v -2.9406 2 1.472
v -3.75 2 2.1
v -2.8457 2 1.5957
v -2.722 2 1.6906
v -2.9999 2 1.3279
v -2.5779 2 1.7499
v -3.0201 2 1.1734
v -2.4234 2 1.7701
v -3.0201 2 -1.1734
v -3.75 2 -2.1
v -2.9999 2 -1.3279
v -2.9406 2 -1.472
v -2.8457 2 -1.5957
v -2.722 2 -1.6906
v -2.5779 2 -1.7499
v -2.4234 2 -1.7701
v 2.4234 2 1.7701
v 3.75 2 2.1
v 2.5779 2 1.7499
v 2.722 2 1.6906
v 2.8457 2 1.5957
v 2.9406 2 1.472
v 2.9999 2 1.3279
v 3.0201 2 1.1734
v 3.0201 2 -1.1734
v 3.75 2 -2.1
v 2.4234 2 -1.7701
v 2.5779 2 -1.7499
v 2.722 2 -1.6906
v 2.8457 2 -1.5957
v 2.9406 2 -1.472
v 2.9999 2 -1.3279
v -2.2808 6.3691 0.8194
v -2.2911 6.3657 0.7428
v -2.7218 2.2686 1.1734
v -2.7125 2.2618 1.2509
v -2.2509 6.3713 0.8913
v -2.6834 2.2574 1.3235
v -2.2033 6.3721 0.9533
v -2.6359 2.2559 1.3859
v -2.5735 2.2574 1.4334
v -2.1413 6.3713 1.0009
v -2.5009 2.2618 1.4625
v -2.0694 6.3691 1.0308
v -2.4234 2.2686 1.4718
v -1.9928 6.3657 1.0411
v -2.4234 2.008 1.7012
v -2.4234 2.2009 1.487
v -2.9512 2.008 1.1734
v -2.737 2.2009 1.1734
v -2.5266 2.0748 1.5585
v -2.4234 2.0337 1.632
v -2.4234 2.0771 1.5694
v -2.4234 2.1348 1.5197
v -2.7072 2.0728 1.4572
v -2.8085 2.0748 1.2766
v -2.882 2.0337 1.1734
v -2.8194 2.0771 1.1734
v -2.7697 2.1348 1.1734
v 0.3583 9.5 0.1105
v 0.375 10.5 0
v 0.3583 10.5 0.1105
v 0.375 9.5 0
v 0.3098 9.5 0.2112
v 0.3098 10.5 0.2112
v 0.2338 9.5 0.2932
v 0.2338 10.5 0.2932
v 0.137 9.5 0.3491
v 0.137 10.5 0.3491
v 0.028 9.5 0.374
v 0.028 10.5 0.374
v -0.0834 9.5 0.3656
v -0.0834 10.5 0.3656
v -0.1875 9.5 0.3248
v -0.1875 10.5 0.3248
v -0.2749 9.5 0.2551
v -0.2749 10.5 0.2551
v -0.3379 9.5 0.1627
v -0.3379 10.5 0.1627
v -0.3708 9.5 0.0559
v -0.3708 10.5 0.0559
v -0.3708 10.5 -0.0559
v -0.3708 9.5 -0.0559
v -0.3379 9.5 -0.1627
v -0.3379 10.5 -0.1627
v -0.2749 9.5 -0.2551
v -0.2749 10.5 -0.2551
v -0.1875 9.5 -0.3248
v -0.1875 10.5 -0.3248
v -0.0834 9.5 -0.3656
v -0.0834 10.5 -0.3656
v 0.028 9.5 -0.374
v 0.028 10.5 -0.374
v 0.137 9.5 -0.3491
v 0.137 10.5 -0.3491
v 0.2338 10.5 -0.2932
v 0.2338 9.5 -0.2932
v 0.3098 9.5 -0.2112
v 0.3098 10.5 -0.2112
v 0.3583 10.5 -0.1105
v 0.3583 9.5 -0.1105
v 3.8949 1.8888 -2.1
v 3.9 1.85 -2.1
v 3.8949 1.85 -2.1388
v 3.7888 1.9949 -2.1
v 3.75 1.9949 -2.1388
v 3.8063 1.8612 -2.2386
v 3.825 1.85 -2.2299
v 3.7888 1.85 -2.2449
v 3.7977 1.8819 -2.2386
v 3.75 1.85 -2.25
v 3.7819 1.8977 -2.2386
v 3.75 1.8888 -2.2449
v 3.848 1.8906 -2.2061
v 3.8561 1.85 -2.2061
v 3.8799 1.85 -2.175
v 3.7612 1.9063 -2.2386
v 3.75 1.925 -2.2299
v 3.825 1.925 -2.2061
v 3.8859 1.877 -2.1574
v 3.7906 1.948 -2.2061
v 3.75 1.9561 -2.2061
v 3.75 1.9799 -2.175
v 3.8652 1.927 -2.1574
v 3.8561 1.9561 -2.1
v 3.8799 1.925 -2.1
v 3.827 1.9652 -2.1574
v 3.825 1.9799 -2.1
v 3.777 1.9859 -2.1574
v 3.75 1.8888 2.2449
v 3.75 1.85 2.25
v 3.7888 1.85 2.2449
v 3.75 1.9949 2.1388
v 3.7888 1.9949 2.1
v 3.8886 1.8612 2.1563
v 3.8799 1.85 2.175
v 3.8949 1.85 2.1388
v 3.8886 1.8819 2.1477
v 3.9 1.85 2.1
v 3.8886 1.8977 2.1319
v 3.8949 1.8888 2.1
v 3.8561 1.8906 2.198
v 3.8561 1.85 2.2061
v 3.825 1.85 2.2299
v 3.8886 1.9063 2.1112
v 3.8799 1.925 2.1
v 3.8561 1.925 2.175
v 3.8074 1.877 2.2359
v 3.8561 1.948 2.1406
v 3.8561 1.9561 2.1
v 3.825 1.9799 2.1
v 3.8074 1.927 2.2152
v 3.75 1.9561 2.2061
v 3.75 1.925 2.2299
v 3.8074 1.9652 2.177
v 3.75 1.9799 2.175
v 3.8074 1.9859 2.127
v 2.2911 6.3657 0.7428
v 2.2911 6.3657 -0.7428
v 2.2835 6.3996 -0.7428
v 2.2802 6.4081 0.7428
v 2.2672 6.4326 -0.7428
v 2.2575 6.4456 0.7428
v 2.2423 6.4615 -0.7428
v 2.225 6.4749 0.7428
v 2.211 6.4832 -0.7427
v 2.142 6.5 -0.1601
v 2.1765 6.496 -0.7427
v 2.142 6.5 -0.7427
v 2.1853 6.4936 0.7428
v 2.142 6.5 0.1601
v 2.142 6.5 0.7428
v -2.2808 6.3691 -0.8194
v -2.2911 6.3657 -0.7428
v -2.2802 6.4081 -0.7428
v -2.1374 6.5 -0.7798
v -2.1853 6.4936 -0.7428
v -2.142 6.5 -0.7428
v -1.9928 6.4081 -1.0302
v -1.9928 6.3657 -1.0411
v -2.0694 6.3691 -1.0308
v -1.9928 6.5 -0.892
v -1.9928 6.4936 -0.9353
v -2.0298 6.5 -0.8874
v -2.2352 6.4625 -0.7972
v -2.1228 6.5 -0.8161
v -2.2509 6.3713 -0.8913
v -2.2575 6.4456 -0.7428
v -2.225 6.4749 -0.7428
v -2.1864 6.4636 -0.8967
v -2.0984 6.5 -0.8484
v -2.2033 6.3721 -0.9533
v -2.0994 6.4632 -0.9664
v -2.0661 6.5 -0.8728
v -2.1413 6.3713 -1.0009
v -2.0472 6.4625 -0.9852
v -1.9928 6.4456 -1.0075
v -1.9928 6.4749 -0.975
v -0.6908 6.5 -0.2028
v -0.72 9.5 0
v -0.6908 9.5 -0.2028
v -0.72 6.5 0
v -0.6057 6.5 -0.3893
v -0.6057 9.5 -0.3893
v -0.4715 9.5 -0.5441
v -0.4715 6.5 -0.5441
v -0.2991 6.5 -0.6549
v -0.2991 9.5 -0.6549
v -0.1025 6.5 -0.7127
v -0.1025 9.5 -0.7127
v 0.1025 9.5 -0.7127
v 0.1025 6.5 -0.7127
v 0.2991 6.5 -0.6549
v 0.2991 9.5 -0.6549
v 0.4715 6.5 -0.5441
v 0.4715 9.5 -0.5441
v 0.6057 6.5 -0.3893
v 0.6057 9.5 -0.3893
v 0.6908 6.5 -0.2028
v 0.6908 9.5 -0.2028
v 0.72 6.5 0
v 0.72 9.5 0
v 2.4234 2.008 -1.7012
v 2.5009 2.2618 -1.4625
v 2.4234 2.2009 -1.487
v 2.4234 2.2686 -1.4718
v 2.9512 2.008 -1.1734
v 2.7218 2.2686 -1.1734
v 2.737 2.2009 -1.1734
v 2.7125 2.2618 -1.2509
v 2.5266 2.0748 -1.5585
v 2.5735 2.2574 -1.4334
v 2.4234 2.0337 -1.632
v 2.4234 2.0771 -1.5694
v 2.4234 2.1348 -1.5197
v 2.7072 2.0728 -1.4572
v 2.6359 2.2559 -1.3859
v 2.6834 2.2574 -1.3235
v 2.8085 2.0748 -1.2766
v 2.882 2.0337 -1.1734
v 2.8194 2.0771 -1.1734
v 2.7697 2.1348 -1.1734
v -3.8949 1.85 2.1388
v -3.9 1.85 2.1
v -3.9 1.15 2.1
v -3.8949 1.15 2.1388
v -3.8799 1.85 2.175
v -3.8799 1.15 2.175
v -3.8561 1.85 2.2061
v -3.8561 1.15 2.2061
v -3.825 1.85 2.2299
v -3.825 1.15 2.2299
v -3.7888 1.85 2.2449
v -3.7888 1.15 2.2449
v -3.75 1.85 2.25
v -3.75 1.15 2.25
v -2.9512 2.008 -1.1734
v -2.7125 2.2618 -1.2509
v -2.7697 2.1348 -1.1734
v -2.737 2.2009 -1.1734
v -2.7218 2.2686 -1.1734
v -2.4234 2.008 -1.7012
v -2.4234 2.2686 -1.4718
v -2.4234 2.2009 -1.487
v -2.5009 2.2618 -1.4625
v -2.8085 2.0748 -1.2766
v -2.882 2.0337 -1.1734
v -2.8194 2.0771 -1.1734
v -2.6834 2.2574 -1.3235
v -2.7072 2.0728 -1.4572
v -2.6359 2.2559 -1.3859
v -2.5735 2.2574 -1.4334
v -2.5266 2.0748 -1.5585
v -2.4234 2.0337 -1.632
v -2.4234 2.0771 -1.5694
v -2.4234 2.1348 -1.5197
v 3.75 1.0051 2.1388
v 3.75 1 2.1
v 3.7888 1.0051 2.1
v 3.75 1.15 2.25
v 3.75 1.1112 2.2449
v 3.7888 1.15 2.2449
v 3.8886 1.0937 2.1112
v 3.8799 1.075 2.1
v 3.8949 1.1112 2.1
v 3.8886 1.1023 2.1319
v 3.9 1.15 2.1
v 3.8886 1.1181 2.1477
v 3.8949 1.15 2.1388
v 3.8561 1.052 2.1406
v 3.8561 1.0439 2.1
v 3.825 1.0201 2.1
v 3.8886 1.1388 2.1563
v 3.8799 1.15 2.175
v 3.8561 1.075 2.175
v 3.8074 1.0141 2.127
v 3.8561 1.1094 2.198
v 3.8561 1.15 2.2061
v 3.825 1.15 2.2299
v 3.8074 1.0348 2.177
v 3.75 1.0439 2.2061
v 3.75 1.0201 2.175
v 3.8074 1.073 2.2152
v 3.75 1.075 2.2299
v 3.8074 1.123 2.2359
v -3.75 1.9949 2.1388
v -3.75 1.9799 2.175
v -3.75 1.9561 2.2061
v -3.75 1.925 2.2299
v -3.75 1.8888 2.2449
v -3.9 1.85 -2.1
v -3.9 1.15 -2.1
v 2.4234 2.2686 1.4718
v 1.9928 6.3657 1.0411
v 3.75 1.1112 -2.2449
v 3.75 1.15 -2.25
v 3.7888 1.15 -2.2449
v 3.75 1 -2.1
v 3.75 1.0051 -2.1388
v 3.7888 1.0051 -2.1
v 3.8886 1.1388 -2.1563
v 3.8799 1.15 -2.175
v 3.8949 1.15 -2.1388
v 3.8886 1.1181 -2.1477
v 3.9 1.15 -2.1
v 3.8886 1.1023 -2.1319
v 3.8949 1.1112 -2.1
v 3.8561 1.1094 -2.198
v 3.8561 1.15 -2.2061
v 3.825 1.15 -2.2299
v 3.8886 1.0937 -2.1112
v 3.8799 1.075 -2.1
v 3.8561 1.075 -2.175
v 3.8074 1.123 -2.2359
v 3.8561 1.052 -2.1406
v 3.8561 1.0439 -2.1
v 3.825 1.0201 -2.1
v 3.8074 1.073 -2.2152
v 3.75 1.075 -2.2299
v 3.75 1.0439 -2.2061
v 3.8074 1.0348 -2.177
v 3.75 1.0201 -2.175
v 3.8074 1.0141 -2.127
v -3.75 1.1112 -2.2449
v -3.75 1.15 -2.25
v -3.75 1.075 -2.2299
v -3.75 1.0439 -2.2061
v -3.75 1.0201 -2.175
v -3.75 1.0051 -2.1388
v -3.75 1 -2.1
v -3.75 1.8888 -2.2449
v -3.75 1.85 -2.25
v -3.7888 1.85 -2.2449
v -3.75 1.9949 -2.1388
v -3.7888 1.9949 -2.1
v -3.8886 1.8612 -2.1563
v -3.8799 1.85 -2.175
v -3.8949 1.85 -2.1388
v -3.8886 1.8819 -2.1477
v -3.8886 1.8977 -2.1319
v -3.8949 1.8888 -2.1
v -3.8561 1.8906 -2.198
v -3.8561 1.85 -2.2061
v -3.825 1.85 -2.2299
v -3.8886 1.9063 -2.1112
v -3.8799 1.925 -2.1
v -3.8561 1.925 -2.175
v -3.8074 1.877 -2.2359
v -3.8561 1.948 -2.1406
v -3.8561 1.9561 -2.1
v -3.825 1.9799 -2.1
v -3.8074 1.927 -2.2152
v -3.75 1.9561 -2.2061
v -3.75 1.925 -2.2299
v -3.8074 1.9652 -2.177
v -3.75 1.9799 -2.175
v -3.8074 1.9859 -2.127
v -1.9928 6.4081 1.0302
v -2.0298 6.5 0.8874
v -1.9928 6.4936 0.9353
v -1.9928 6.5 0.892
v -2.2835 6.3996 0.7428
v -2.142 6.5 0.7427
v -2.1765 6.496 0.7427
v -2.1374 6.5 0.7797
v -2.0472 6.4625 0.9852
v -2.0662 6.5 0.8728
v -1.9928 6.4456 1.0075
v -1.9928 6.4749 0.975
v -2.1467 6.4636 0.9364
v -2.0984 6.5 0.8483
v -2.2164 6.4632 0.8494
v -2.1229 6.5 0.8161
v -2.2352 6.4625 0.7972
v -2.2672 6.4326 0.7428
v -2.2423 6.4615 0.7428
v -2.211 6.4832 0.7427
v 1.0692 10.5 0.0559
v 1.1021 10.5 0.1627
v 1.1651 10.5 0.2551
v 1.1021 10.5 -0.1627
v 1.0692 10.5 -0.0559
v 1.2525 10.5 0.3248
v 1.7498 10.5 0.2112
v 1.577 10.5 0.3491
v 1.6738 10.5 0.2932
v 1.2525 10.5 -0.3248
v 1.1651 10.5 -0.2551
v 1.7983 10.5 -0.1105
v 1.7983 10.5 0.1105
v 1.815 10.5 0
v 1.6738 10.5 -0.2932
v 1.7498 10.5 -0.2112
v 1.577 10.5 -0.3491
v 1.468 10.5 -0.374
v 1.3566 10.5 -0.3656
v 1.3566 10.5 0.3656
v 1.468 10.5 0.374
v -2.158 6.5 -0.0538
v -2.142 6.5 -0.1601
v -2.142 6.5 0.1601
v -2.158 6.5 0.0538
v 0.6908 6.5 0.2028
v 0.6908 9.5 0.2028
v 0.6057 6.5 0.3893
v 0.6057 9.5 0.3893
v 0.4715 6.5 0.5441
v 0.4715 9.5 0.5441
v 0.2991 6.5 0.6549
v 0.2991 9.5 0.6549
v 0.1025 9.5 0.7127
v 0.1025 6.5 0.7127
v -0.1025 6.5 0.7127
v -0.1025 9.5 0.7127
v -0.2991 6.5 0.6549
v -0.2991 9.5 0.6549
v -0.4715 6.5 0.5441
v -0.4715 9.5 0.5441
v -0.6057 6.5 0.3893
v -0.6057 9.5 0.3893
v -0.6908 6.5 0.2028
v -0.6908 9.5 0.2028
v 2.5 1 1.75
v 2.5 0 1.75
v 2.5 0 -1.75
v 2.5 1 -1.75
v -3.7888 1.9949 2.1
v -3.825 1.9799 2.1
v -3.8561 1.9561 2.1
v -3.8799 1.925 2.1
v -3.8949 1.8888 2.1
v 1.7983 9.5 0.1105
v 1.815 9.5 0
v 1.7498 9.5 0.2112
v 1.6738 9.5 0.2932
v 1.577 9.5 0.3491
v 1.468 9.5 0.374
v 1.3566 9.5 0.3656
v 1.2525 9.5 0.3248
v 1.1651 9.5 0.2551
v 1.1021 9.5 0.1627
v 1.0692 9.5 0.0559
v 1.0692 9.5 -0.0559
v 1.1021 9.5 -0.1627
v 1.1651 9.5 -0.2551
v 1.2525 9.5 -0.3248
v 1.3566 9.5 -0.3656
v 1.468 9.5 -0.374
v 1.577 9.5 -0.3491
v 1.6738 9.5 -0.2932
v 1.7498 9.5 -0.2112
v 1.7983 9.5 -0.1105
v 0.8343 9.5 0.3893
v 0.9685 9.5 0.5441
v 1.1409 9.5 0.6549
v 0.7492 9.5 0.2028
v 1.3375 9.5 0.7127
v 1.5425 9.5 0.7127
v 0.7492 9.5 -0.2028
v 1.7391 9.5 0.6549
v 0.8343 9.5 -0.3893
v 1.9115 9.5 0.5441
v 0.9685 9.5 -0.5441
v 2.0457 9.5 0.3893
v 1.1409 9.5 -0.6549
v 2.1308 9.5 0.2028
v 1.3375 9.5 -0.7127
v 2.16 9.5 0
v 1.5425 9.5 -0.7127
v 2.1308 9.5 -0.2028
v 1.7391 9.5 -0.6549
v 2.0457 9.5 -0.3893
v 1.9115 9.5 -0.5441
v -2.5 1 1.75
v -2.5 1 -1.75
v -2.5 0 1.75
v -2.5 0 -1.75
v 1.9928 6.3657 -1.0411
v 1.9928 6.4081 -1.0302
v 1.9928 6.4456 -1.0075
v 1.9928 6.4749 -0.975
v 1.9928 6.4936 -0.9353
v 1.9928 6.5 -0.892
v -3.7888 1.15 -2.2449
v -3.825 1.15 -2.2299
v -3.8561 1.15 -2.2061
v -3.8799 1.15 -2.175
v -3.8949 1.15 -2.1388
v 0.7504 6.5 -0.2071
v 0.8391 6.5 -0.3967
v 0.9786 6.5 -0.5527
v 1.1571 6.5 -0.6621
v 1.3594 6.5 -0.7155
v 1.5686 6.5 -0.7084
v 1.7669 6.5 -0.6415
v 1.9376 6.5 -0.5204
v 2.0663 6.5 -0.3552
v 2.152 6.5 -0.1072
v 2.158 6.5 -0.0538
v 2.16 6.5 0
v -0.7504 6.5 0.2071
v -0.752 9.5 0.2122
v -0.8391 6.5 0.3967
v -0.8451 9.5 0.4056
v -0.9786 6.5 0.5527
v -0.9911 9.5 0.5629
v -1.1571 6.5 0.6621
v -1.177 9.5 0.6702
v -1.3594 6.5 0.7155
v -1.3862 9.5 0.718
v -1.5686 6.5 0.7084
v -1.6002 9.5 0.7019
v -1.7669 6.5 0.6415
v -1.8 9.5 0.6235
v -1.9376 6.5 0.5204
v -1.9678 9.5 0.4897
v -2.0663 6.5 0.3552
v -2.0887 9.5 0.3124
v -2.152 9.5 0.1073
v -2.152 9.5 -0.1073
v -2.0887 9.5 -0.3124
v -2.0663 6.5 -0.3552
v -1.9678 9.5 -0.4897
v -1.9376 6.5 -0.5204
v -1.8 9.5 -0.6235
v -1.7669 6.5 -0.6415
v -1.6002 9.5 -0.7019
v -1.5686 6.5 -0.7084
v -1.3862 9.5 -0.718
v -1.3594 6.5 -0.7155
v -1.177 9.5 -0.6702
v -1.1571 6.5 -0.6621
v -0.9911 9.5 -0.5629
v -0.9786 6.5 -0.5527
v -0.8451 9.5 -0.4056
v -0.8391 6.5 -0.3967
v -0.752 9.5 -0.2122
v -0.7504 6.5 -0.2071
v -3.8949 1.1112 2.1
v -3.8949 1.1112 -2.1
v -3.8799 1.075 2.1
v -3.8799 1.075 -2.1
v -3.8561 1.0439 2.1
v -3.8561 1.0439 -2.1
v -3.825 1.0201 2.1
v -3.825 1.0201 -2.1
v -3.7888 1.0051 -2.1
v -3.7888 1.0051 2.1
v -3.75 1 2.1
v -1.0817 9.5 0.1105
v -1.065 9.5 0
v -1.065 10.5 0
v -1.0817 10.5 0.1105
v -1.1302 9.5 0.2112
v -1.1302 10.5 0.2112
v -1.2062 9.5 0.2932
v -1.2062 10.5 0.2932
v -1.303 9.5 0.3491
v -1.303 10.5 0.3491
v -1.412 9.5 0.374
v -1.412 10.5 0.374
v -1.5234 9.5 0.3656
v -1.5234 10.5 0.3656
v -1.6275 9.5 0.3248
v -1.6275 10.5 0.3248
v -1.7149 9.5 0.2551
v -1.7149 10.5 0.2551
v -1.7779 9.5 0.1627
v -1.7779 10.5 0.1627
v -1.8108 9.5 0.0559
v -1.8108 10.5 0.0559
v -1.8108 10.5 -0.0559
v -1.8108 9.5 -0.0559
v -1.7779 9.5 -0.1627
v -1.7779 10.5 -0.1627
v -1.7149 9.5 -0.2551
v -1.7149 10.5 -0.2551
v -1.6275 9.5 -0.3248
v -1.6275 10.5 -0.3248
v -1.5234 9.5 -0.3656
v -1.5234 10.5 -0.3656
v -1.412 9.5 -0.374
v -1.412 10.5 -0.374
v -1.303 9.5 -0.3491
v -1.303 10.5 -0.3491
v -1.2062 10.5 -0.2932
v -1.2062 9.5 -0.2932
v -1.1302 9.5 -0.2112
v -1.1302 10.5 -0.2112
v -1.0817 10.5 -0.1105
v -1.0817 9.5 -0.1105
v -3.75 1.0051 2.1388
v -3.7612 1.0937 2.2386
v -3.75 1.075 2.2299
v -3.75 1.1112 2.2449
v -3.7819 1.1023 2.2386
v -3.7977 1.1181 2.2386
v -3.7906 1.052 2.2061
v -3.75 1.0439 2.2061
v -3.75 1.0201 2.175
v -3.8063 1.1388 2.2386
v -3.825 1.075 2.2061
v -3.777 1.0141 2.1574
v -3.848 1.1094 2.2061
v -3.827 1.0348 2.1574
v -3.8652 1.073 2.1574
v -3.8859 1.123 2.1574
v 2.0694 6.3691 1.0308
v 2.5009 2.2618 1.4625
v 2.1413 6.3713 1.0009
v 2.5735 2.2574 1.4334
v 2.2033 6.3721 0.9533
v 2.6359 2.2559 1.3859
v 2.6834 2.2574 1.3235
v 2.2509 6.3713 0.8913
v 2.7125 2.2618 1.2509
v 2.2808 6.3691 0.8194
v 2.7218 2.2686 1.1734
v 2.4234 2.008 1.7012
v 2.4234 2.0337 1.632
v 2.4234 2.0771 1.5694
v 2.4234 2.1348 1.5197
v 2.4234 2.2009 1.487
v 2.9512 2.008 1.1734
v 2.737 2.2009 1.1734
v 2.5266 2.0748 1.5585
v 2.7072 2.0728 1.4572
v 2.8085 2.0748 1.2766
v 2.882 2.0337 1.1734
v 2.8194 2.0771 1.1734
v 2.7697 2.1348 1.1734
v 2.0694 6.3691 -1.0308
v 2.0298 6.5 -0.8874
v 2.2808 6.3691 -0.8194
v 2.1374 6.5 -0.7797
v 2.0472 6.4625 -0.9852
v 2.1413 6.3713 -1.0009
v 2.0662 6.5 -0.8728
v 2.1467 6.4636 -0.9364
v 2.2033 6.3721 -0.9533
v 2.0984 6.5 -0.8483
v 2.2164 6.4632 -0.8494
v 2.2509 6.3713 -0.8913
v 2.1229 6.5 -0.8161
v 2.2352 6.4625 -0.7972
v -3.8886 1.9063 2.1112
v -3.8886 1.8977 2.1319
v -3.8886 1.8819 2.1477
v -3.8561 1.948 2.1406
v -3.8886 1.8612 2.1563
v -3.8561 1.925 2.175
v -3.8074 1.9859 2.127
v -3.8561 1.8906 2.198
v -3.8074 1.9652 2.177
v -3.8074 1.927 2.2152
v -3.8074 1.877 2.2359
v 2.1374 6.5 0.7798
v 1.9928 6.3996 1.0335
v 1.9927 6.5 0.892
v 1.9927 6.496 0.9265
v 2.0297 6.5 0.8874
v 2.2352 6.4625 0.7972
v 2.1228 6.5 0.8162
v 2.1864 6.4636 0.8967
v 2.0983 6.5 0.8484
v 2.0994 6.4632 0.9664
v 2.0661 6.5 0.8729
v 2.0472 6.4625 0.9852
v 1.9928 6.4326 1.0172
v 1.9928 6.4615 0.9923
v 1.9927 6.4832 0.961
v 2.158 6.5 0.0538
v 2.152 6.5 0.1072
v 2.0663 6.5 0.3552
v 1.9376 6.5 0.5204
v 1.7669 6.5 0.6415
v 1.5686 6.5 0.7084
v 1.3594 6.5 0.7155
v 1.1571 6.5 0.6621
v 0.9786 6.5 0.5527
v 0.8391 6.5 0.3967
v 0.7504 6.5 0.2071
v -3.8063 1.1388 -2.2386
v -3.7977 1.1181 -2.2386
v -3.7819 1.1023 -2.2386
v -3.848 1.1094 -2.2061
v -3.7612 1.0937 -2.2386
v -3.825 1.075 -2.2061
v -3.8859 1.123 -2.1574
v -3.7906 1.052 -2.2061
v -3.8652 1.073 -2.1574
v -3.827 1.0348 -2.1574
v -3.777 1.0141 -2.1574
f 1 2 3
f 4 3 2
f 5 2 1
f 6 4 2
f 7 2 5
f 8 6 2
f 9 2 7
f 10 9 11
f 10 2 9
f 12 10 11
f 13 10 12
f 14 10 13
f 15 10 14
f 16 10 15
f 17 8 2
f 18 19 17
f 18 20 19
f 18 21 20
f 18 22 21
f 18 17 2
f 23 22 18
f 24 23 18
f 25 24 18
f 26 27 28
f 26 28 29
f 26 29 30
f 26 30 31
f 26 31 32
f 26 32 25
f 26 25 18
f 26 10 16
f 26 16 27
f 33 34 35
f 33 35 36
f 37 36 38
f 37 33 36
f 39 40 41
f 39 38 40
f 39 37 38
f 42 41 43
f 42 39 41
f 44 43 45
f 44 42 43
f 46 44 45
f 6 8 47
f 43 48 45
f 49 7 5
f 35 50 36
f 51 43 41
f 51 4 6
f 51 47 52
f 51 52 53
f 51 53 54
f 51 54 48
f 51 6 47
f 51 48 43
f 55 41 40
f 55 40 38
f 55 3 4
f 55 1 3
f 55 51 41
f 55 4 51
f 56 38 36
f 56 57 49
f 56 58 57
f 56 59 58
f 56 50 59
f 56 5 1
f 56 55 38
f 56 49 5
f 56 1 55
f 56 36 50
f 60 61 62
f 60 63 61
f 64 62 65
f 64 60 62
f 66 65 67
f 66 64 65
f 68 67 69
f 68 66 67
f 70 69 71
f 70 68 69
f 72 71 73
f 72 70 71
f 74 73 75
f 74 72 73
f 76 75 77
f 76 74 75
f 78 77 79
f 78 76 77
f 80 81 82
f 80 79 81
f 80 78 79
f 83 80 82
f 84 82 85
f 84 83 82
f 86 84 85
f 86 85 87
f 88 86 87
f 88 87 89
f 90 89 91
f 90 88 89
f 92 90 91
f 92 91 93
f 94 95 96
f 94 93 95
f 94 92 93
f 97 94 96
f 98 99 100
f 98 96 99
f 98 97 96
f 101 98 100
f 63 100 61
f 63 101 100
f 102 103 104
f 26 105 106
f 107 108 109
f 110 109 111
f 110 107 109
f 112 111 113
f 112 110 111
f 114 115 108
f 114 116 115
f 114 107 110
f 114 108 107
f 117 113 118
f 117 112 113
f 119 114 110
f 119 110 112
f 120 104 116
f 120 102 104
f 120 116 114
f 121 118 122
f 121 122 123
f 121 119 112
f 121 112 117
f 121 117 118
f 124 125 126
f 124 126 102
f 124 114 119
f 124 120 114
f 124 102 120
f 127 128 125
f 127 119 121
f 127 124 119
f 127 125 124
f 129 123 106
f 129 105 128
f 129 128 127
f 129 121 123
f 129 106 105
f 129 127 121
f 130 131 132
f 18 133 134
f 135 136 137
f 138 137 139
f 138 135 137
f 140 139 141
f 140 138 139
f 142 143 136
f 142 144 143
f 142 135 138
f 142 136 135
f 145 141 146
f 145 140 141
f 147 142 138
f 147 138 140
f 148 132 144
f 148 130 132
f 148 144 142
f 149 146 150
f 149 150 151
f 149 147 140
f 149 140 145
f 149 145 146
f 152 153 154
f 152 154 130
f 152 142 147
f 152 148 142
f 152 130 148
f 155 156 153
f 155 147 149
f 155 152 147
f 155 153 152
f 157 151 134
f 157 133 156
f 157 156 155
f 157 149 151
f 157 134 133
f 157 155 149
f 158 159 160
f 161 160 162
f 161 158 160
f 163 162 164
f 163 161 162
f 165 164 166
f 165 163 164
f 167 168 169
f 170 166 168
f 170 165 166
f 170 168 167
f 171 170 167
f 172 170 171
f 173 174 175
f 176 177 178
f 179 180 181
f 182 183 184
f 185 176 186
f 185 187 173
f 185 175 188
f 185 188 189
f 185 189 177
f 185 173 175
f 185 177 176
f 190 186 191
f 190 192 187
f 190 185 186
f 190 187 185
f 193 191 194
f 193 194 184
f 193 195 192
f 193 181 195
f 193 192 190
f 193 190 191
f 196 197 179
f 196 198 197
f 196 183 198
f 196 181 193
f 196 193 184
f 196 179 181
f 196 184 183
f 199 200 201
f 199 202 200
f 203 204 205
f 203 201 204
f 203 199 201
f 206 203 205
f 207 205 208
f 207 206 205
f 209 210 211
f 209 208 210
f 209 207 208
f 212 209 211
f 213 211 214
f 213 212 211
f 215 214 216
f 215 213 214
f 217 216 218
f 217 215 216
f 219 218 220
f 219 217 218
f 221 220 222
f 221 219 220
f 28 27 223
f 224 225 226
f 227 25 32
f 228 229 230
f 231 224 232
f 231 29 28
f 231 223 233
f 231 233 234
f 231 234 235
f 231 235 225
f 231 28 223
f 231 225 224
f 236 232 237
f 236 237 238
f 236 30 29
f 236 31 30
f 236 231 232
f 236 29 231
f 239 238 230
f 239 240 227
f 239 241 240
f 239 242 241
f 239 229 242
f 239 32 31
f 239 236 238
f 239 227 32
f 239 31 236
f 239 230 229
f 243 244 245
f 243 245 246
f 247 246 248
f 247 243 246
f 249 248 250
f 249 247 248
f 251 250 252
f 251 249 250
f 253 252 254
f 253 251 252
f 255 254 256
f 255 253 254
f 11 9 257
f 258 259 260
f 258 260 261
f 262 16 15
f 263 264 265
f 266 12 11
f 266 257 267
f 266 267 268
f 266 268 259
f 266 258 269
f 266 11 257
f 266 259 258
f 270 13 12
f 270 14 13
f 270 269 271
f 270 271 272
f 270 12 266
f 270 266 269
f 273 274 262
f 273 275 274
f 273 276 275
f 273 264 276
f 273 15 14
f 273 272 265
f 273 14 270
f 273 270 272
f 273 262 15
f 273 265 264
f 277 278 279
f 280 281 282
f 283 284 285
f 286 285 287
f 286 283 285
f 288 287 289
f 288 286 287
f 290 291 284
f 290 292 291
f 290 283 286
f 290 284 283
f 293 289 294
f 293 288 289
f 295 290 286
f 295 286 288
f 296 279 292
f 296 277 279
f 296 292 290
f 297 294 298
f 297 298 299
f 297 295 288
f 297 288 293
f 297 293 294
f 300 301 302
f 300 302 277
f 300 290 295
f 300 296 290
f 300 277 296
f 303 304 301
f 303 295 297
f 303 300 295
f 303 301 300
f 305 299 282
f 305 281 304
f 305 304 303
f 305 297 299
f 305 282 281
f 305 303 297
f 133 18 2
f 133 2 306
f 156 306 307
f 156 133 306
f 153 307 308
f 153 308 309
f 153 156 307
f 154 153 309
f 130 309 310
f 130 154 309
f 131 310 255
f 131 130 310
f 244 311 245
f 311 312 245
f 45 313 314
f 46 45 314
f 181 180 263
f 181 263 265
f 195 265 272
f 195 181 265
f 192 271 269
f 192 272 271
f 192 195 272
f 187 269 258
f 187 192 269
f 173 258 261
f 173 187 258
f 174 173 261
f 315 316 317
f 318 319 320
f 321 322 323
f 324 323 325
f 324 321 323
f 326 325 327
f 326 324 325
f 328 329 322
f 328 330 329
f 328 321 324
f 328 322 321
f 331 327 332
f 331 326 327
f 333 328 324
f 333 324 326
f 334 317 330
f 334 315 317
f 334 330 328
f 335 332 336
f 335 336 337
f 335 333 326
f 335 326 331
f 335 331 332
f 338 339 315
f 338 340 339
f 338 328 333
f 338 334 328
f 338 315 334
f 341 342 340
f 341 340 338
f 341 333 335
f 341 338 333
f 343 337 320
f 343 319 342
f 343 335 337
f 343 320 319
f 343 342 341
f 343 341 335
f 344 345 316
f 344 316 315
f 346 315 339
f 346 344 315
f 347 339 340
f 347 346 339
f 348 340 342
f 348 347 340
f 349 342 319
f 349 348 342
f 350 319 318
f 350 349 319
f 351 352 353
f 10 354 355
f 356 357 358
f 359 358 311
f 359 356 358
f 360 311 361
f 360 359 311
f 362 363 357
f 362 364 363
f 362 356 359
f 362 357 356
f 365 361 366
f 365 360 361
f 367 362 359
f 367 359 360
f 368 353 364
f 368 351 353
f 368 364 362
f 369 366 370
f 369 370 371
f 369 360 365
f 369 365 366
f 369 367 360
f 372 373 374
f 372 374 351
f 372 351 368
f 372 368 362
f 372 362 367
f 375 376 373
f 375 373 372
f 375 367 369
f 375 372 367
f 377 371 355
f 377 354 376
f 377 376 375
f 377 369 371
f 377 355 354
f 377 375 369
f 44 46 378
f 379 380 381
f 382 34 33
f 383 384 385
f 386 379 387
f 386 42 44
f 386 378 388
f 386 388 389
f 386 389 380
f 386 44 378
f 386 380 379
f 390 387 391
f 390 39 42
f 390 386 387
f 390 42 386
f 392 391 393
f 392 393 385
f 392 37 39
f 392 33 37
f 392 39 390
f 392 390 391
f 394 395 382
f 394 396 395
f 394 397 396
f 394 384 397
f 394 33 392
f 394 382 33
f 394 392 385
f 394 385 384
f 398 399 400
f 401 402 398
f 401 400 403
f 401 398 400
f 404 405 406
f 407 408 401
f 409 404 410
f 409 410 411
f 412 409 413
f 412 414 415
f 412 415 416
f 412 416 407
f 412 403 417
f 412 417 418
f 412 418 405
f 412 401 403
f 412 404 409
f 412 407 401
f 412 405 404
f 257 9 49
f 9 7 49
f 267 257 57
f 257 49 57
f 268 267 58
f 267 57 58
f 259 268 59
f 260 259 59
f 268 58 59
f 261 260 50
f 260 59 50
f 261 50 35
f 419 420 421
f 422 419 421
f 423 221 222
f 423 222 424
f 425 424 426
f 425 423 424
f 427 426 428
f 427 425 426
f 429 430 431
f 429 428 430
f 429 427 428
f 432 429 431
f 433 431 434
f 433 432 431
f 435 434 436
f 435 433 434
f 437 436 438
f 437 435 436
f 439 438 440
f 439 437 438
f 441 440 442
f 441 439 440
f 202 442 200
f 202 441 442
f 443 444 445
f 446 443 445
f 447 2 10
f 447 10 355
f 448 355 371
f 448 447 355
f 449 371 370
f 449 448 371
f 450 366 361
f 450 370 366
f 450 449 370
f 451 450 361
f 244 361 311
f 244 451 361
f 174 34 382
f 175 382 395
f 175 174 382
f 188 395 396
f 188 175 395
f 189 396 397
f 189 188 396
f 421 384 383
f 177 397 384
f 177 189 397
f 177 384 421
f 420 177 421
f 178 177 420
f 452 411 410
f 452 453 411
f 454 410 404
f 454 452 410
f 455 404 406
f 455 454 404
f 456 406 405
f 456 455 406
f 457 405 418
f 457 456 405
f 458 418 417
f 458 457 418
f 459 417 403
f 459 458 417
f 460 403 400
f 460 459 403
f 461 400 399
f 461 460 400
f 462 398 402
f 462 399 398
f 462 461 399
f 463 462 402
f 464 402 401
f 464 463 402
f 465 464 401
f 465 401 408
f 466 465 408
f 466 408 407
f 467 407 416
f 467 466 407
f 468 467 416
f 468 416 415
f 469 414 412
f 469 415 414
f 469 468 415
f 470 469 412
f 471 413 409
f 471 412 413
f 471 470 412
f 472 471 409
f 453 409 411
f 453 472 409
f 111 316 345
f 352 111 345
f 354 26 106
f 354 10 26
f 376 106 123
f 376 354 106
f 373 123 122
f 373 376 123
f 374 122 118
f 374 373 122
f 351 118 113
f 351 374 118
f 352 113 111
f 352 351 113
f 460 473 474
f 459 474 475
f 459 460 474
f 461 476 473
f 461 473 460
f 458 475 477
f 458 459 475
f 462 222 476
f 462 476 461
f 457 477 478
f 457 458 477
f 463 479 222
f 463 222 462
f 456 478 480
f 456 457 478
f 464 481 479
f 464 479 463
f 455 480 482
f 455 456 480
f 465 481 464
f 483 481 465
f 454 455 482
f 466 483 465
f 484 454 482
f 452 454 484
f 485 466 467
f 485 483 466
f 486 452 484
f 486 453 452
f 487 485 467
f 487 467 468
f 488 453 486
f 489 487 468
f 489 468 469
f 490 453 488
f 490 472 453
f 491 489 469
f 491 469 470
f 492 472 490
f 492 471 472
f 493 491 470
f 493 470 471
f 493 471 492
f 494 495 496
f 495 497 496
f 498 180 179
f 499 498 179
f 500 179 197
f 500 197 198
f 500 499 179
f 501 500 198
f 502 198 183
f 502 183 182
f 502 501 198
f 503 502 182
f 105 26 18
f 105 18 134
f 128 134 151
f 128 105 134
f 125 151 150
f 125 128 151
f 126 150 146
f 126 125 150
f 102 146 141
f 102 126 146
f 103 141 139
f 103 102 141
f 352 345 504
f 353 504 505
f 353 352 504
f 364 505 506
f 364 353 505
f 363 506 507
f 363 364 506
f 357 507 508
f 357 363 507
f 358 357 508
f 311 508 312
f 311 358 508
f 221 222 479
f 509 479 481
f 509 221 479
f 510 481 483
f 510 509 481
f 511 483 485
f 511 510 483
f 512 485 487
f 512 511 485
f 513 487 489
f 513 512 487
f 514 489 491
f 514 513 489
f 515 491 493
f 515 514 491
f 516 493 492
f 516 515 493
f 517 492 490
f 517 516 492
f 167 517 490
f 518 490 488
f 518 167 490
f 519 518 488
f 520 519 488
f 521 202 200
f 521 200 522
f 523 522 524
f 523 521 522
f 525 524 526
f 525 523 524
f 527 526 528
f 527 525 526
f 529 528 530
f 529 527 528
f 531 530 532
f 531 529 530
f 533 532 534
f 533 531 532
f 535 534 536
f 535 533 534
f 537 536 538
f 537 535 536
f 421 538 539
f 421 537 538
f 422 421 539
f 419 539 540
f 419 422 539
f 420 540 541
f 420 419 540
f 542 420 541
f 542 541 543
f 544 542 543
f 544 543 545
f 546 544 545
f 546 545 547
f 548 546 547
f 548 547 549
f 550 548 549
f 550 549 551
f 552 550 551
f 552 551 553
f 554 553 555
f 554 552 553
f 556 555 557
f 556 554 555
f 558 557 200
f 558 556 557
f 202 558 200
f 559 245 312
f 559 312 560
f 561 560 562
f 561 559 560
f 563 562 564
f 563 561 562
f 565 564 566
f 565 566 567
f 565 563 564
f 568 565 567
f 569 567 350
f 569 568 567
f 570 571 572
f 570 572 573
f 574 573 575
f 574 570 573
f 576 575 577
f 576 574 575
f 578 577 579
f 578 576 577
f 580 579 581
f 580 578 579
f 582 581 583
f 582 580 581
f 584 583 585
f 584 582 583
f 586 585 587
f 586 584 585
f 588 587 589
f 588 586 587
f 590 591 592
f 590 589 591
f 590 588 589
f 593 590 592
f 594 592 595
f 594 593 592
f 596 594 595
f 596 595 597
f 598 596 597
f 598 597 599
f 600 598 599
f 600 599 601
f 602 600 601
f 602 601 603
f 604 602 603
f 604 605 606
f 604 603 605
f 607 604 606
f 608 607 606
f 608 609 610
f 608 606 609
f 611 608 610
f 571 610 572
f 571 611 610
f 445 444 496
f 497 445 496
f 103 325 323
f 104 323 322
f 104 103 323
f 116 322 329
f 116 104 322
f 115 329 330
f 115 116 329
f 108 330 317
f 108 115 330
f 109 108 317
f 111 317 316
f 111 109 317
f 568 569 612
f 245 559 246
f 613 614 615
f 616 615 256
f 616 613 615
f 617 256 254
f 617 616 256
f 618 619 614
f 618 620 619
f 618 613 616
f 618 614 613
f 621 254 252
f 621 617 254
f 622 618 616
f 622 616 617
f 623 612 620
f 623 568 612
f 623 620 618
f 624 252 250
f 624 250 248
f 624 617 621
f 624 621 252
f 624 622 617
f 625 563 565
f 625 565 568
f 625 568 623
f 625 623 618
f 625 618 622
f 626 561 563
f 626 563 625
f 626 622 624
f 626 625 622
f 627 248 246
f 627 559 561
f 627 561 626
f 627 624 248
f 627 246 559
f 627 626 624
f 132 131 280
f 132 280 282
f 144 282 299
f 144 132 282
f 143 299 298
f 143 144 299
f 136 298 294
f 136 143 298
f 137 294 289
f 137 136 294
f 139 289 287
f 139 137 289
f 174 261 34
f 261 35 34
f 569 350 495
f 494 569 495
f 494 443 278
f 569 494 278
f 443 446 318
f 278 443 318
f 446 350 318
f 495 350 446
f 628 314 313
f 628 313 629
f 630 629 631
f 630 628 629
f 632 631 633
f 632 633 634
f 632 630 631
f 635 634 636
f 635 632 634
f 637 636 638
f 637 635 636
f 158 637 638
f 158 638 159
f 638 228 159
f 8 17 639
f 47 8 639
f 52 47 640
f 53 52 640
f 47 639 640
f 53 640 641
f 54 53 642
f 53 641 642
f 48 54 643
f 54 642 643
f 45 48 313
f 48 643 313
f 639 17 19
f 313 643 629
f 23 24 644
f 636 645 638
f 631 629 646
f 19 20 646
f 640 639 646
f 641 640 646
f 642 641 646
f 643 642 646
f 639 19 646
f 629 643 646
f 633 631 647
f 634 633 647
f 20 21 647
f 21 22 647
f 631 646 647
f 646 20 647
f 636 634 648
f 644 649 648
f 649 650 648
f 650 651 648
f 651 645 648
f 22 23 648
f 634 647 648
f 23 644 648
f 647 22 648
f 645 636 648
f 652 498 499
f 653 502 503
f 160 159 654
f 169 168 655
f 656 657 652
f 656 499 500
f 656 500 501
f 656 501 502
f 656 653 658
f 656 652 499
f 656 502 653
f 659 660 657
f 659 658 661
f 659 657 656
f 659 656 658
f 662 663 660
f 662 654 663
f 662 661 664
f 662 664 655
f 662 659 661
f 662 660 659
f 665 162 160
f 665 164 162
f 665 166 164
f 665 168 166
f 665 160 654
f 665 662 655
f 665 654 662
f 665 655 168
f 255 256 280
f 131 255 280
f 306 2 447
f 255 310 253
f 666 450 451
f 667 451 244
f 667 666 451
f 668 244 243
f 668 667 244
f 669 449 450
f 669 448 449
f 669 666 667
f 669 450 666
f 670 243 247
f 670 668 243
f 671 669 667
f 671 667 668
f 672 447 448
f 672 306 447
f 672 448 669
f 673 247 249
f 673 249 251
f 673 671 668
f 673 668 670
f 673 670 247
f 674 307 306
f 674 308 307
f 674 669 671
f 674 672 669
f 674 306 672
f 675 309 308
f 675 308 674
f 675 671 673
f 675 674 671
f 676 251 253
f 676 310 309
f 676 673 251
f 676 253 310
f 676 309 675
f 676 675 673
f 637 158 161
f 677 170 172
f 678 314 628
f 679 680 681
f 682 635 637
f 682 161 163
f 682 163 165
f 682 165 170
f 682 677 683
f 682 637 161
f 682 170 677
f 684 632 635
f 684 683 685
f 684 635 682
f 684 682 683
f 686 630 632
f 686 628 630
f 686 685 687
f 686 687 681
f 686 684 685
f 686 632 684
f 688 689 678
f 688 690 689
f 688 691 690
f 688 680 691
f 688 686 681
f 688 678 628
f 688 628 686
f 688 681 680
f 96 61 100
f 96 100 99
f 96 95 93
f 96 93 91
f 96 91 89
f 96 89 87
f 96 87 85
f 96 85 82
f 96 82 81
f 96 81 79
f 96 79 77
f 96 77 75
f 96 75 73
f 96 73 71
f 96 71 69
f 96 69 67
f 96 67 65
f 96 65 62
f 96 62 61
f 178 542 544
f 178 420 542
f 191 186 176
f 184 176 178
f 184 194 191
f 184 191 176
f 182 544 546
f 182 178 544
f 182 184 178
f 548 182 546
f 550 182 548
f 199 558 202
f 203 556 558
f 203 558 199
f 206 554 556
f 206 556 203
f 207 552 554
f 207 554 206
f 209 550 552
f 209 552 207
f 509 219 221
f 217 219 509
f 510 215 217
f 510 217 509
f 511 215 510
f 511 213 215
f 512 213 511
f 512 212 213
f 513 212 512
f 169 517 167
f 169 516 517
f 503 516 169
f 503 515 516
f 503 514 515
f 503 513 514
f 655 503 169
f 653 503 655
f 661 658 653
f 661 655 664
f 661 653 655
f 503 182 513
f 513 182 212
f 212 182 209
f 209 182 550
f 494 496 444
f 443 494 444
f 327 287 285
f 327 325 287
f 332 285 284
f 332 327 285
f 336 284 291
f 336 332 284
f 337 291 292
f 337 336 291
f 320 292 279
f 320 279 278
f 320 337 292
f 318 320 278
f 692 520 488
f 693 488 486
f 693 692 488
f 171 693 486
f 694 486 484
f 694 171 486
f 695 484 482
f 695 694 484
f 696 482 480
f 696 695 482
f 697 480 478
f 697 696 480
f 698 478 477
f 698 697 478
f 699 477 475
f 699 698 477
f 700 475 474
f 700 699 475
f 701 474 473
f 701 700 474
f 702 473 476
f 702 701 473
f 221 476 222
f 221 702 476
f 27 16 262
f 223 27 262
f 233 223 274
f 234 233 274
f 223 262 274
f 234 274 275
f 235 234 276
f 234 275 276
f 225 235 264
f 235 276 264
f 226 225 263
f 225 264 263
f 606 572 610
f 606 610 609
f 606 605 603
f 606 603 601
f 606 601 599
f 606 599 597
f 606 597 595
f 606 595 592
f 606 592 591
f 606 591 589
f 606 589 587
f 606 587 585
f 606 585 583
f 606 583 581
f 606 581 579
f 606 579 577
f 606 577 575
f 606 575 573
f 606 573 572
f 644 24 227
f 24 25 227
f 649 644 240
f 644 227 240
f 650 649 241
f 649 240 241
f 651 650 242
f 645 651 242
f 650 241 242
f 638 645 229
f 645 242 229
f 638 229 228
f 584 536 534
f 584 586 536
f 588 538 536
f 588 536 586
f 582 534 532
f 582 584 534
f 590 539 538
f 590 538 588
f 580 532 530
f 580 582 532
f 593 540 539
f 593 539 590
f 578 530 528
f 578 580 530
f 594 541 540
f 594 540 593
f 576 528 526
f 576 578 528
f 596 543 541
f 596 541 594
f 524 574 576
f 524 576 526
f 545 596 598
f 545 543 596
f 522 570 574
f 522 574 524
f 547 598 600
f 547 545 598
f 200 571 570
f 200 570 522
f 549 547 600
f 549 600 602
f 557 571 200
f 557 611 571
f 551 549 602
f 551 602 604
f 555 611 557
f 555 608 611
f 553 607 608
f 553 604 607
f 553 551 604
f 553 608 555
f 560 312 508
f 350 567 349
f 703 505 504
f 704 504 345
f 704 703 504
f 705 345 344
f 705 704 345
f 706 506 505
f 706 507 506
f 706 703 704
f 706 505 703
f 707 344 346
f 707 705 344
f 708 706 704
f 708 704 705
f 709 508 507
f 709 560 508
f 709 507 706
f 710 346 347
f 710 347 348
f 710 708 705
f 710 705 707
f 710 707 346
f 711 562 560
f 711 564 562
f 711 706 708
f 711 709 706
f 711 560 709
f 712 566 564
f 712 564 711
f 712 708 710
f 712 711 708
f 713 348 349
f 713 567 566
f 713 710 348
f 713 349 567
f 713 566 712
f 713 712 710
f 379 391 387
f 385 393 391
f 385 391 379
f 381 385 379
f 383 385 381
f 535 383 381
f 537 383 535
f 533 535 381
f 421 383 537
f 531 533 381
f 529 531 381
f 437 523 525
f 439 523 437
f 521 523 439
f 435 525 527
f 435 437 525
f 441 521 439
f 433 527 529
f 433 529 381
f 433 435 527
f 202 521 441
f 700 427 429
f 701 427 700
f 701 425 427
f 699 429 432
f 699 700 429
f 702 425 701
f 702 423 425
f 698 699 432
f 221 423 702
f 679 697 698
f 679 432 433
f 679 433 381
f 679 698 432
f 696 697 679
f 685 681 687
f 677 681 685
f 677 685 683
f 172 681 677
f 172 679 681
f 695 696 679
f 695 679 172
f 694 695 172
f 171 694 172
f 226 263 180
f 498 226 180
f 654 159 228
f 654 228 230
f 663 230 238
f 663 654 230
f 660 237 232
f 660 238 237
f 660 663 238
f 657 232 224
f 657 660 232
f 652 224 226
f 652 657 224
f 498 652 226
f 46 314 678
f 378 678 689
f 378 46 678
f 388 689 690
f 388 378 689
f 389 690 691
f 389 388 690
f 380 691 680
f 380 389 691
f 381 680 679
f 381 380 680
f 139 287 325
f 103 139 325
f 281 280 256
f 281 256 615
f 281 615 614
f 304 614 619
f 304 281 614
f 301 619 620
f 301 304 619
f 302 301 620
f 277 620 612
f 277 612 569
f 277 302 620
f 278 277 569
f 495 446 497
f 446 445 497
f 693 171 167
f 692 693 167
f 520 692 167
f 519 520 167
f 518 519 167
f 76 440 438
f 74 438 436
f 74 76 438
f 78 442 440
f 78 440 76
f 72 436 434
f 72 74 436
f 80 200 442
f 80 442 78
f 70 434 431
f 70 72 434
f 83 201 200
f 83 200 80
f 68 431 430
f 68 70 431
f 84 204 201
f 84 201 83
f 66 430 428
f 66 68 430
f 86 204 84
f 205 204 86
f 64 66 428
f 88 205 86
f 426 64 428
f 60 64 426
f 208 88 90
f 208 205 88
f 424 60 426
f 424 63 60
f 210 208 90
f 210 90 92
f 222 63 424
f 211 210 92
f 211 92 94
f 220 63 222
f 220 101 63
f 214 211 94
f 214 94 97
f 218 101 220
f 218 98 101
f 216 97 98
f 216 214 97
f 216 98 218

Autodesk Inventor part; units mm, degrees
ref_plane "YZ Plane" through (0, 0, 0) normal (1, 0, 0) x (0, 1, 0)
ref_plane "XZ Plane" through (0, 0, 0) normal (0, 1, 0) x (-1, 0, 0)
ref_plane "XY Plane" through (0, 0, 0) normal (0, 0, 1) x (1, 0, 0)
sketch "Sketch1" plane through (0, 0, 0) normal (0, 1, 0) x (-1, 0, 0)
  line L0 (-2.5, -1.75) -> (2.5, -1.75)
  line L1 (2.5, -1.75) -> (2.5, 1.75)
  line L2 (2.5, 1.75) -> (-2.5, 1.75)
  line L3 (-2.5, 1.75) -> (-2.5, -1.75)
  line L4 (-2.5, -1.75) -> (2.5, 1.75) construction
  line L5 (2.5, -1.75) -> (-2.5, 1.75) construction
  point P0 (0, 0)
  dimension "d0" = 5
  dimension "d1" = 3.5
extrude "Extrusion1" add sketch "Sketch1" along normal blind 1
sketch "Sketch2" plane through (0, 1, 0) normal (0, 1, 0) x (1, 0, 0)
  line L0 (-3.9, -2.25) -> (3.9, -2.25)
  line L1 (3.9, -2.25) -> (3.9, 2.25)
  line L2 (3.9, 2.25) -> (-3.9, 2.25)
  line L3 (-3.9, 2.25) -> (-3.9, -2.25)
  line L4 (-3.9, -2.25) -> (3.9, 2.25) construction
  line L5 (3.9, -2.25) -> (-3.9, 2.25) construction
  point P0 (0, 0)
  dimension "d4" = 7.8
  dimension "d5" = 4.5
extrude "Extrusion2" add sketch "Sketch2" along normal blind 1
sketch "Sketch3" plane through (0, 2, 0) normal (0, 1, 0) x (1, 0, 0)
  line L0 (-2.75, -1.5) -> (2.75, -1.5)
  line L1 (2.75, -1.5) -> (2.75, 1.5)
  line L2 (2.75, 1.5) -> (-2.75, 1.5)
  line L3 (-2.75, 1.5) -> (-2.75, -1.5)
  line L4 (-2.75, -1.5) -> (2.75, 1.5) construction
  line L5 (2.75, -1.5) -> (-2.75, 1.5) construction
  point P0 (0, 0)
  dimension "d8" = 5.5
  dimension "d9" = 3
extrude "Extrusion3" add sketch "Sketch3" along normal blind 4.5 draft -6
fillet "Fillet1" radius 0.3 8 edges at (2.5135, 4.25, 1.2635) (-2.5135, 4.25, 1.2635) (0, 2, 1.5) (2.75, 2, 0) (2.5135, 4.25, -1.2635) (0, 2, -1.5) (-2.5135, 4.25, -1.2635) (-2.75, 2, 0)
fillet "Fillet2" radius 0.15 20 edges at (0, 2, 2.25) (3.9, 2, 0) (0, 2, -2.25) (-3.9, 2, 0) (-3.9, 1, 0) (-3.9, 1.5, 2.25) (-3.9, 1.5, -2.25) (0, 1, -2.25) (3.9, 1.5, -2.25) (0, 1, 2.25) (3.9, 1.5, 2.25) (3.9, 1, 0) (-2.1898, 6.5, -0.9398) (-2.277, 6.5, 0) (-2.1898, 6.5, 0.9398) (0, 6.5, 1.027) (2.1898, 6.5, 0.9398) (2.277, 6.5, 0) (2.1898, 6.5, -0.9398) (0, 6.5, -1.027)
sketch "Sketch4" plane through (0, 6.5, 0) normal (0, 1, 0) x (1, 0, 0)
  circle A0 centre (0, 0) radius 0.72
  circle A1 centre (1.44, 0) radius 0.72
  circle A2 centre (-1.44, 0) radius 0.72
  dimension "d14" = 1.44
  dimension "d15" = 1.44
  dimension "d16" = 1.44
extrude "Extrusion4" add sketch "Sketch4" along normal blind 3
sketch "Sketch5" plane through (-1.44, 9.5, 0) normal (0, 1, 0) x (1, 0, 0)
  circle A0 centre (0, 0) radius 0.72 projected
  arc A1 (0.72, 0) -> (2.16, 0) centre (1.44, 0) ccw projected
  arc A2 (2.16, 0) -> (0.72, 0) centre (1.44, 0) ccw projected
  circle A3 centre (2.88, 0) radius 0.72 projected
  circle A4 centre (0, 0) radius 0.375
  circle A5 centre (1.44, 0) radius 0.375
  circle A6 centre (2.88, 0) radius 0.375
  dimension "d20" = 0.75
  dimension "d21" = 0.75
extrude "Extrusion5" add sketch "Sketch5" along normal blind 1 contours A4 | A5 | A6
properties part number "wire" material "PET Plastic"
